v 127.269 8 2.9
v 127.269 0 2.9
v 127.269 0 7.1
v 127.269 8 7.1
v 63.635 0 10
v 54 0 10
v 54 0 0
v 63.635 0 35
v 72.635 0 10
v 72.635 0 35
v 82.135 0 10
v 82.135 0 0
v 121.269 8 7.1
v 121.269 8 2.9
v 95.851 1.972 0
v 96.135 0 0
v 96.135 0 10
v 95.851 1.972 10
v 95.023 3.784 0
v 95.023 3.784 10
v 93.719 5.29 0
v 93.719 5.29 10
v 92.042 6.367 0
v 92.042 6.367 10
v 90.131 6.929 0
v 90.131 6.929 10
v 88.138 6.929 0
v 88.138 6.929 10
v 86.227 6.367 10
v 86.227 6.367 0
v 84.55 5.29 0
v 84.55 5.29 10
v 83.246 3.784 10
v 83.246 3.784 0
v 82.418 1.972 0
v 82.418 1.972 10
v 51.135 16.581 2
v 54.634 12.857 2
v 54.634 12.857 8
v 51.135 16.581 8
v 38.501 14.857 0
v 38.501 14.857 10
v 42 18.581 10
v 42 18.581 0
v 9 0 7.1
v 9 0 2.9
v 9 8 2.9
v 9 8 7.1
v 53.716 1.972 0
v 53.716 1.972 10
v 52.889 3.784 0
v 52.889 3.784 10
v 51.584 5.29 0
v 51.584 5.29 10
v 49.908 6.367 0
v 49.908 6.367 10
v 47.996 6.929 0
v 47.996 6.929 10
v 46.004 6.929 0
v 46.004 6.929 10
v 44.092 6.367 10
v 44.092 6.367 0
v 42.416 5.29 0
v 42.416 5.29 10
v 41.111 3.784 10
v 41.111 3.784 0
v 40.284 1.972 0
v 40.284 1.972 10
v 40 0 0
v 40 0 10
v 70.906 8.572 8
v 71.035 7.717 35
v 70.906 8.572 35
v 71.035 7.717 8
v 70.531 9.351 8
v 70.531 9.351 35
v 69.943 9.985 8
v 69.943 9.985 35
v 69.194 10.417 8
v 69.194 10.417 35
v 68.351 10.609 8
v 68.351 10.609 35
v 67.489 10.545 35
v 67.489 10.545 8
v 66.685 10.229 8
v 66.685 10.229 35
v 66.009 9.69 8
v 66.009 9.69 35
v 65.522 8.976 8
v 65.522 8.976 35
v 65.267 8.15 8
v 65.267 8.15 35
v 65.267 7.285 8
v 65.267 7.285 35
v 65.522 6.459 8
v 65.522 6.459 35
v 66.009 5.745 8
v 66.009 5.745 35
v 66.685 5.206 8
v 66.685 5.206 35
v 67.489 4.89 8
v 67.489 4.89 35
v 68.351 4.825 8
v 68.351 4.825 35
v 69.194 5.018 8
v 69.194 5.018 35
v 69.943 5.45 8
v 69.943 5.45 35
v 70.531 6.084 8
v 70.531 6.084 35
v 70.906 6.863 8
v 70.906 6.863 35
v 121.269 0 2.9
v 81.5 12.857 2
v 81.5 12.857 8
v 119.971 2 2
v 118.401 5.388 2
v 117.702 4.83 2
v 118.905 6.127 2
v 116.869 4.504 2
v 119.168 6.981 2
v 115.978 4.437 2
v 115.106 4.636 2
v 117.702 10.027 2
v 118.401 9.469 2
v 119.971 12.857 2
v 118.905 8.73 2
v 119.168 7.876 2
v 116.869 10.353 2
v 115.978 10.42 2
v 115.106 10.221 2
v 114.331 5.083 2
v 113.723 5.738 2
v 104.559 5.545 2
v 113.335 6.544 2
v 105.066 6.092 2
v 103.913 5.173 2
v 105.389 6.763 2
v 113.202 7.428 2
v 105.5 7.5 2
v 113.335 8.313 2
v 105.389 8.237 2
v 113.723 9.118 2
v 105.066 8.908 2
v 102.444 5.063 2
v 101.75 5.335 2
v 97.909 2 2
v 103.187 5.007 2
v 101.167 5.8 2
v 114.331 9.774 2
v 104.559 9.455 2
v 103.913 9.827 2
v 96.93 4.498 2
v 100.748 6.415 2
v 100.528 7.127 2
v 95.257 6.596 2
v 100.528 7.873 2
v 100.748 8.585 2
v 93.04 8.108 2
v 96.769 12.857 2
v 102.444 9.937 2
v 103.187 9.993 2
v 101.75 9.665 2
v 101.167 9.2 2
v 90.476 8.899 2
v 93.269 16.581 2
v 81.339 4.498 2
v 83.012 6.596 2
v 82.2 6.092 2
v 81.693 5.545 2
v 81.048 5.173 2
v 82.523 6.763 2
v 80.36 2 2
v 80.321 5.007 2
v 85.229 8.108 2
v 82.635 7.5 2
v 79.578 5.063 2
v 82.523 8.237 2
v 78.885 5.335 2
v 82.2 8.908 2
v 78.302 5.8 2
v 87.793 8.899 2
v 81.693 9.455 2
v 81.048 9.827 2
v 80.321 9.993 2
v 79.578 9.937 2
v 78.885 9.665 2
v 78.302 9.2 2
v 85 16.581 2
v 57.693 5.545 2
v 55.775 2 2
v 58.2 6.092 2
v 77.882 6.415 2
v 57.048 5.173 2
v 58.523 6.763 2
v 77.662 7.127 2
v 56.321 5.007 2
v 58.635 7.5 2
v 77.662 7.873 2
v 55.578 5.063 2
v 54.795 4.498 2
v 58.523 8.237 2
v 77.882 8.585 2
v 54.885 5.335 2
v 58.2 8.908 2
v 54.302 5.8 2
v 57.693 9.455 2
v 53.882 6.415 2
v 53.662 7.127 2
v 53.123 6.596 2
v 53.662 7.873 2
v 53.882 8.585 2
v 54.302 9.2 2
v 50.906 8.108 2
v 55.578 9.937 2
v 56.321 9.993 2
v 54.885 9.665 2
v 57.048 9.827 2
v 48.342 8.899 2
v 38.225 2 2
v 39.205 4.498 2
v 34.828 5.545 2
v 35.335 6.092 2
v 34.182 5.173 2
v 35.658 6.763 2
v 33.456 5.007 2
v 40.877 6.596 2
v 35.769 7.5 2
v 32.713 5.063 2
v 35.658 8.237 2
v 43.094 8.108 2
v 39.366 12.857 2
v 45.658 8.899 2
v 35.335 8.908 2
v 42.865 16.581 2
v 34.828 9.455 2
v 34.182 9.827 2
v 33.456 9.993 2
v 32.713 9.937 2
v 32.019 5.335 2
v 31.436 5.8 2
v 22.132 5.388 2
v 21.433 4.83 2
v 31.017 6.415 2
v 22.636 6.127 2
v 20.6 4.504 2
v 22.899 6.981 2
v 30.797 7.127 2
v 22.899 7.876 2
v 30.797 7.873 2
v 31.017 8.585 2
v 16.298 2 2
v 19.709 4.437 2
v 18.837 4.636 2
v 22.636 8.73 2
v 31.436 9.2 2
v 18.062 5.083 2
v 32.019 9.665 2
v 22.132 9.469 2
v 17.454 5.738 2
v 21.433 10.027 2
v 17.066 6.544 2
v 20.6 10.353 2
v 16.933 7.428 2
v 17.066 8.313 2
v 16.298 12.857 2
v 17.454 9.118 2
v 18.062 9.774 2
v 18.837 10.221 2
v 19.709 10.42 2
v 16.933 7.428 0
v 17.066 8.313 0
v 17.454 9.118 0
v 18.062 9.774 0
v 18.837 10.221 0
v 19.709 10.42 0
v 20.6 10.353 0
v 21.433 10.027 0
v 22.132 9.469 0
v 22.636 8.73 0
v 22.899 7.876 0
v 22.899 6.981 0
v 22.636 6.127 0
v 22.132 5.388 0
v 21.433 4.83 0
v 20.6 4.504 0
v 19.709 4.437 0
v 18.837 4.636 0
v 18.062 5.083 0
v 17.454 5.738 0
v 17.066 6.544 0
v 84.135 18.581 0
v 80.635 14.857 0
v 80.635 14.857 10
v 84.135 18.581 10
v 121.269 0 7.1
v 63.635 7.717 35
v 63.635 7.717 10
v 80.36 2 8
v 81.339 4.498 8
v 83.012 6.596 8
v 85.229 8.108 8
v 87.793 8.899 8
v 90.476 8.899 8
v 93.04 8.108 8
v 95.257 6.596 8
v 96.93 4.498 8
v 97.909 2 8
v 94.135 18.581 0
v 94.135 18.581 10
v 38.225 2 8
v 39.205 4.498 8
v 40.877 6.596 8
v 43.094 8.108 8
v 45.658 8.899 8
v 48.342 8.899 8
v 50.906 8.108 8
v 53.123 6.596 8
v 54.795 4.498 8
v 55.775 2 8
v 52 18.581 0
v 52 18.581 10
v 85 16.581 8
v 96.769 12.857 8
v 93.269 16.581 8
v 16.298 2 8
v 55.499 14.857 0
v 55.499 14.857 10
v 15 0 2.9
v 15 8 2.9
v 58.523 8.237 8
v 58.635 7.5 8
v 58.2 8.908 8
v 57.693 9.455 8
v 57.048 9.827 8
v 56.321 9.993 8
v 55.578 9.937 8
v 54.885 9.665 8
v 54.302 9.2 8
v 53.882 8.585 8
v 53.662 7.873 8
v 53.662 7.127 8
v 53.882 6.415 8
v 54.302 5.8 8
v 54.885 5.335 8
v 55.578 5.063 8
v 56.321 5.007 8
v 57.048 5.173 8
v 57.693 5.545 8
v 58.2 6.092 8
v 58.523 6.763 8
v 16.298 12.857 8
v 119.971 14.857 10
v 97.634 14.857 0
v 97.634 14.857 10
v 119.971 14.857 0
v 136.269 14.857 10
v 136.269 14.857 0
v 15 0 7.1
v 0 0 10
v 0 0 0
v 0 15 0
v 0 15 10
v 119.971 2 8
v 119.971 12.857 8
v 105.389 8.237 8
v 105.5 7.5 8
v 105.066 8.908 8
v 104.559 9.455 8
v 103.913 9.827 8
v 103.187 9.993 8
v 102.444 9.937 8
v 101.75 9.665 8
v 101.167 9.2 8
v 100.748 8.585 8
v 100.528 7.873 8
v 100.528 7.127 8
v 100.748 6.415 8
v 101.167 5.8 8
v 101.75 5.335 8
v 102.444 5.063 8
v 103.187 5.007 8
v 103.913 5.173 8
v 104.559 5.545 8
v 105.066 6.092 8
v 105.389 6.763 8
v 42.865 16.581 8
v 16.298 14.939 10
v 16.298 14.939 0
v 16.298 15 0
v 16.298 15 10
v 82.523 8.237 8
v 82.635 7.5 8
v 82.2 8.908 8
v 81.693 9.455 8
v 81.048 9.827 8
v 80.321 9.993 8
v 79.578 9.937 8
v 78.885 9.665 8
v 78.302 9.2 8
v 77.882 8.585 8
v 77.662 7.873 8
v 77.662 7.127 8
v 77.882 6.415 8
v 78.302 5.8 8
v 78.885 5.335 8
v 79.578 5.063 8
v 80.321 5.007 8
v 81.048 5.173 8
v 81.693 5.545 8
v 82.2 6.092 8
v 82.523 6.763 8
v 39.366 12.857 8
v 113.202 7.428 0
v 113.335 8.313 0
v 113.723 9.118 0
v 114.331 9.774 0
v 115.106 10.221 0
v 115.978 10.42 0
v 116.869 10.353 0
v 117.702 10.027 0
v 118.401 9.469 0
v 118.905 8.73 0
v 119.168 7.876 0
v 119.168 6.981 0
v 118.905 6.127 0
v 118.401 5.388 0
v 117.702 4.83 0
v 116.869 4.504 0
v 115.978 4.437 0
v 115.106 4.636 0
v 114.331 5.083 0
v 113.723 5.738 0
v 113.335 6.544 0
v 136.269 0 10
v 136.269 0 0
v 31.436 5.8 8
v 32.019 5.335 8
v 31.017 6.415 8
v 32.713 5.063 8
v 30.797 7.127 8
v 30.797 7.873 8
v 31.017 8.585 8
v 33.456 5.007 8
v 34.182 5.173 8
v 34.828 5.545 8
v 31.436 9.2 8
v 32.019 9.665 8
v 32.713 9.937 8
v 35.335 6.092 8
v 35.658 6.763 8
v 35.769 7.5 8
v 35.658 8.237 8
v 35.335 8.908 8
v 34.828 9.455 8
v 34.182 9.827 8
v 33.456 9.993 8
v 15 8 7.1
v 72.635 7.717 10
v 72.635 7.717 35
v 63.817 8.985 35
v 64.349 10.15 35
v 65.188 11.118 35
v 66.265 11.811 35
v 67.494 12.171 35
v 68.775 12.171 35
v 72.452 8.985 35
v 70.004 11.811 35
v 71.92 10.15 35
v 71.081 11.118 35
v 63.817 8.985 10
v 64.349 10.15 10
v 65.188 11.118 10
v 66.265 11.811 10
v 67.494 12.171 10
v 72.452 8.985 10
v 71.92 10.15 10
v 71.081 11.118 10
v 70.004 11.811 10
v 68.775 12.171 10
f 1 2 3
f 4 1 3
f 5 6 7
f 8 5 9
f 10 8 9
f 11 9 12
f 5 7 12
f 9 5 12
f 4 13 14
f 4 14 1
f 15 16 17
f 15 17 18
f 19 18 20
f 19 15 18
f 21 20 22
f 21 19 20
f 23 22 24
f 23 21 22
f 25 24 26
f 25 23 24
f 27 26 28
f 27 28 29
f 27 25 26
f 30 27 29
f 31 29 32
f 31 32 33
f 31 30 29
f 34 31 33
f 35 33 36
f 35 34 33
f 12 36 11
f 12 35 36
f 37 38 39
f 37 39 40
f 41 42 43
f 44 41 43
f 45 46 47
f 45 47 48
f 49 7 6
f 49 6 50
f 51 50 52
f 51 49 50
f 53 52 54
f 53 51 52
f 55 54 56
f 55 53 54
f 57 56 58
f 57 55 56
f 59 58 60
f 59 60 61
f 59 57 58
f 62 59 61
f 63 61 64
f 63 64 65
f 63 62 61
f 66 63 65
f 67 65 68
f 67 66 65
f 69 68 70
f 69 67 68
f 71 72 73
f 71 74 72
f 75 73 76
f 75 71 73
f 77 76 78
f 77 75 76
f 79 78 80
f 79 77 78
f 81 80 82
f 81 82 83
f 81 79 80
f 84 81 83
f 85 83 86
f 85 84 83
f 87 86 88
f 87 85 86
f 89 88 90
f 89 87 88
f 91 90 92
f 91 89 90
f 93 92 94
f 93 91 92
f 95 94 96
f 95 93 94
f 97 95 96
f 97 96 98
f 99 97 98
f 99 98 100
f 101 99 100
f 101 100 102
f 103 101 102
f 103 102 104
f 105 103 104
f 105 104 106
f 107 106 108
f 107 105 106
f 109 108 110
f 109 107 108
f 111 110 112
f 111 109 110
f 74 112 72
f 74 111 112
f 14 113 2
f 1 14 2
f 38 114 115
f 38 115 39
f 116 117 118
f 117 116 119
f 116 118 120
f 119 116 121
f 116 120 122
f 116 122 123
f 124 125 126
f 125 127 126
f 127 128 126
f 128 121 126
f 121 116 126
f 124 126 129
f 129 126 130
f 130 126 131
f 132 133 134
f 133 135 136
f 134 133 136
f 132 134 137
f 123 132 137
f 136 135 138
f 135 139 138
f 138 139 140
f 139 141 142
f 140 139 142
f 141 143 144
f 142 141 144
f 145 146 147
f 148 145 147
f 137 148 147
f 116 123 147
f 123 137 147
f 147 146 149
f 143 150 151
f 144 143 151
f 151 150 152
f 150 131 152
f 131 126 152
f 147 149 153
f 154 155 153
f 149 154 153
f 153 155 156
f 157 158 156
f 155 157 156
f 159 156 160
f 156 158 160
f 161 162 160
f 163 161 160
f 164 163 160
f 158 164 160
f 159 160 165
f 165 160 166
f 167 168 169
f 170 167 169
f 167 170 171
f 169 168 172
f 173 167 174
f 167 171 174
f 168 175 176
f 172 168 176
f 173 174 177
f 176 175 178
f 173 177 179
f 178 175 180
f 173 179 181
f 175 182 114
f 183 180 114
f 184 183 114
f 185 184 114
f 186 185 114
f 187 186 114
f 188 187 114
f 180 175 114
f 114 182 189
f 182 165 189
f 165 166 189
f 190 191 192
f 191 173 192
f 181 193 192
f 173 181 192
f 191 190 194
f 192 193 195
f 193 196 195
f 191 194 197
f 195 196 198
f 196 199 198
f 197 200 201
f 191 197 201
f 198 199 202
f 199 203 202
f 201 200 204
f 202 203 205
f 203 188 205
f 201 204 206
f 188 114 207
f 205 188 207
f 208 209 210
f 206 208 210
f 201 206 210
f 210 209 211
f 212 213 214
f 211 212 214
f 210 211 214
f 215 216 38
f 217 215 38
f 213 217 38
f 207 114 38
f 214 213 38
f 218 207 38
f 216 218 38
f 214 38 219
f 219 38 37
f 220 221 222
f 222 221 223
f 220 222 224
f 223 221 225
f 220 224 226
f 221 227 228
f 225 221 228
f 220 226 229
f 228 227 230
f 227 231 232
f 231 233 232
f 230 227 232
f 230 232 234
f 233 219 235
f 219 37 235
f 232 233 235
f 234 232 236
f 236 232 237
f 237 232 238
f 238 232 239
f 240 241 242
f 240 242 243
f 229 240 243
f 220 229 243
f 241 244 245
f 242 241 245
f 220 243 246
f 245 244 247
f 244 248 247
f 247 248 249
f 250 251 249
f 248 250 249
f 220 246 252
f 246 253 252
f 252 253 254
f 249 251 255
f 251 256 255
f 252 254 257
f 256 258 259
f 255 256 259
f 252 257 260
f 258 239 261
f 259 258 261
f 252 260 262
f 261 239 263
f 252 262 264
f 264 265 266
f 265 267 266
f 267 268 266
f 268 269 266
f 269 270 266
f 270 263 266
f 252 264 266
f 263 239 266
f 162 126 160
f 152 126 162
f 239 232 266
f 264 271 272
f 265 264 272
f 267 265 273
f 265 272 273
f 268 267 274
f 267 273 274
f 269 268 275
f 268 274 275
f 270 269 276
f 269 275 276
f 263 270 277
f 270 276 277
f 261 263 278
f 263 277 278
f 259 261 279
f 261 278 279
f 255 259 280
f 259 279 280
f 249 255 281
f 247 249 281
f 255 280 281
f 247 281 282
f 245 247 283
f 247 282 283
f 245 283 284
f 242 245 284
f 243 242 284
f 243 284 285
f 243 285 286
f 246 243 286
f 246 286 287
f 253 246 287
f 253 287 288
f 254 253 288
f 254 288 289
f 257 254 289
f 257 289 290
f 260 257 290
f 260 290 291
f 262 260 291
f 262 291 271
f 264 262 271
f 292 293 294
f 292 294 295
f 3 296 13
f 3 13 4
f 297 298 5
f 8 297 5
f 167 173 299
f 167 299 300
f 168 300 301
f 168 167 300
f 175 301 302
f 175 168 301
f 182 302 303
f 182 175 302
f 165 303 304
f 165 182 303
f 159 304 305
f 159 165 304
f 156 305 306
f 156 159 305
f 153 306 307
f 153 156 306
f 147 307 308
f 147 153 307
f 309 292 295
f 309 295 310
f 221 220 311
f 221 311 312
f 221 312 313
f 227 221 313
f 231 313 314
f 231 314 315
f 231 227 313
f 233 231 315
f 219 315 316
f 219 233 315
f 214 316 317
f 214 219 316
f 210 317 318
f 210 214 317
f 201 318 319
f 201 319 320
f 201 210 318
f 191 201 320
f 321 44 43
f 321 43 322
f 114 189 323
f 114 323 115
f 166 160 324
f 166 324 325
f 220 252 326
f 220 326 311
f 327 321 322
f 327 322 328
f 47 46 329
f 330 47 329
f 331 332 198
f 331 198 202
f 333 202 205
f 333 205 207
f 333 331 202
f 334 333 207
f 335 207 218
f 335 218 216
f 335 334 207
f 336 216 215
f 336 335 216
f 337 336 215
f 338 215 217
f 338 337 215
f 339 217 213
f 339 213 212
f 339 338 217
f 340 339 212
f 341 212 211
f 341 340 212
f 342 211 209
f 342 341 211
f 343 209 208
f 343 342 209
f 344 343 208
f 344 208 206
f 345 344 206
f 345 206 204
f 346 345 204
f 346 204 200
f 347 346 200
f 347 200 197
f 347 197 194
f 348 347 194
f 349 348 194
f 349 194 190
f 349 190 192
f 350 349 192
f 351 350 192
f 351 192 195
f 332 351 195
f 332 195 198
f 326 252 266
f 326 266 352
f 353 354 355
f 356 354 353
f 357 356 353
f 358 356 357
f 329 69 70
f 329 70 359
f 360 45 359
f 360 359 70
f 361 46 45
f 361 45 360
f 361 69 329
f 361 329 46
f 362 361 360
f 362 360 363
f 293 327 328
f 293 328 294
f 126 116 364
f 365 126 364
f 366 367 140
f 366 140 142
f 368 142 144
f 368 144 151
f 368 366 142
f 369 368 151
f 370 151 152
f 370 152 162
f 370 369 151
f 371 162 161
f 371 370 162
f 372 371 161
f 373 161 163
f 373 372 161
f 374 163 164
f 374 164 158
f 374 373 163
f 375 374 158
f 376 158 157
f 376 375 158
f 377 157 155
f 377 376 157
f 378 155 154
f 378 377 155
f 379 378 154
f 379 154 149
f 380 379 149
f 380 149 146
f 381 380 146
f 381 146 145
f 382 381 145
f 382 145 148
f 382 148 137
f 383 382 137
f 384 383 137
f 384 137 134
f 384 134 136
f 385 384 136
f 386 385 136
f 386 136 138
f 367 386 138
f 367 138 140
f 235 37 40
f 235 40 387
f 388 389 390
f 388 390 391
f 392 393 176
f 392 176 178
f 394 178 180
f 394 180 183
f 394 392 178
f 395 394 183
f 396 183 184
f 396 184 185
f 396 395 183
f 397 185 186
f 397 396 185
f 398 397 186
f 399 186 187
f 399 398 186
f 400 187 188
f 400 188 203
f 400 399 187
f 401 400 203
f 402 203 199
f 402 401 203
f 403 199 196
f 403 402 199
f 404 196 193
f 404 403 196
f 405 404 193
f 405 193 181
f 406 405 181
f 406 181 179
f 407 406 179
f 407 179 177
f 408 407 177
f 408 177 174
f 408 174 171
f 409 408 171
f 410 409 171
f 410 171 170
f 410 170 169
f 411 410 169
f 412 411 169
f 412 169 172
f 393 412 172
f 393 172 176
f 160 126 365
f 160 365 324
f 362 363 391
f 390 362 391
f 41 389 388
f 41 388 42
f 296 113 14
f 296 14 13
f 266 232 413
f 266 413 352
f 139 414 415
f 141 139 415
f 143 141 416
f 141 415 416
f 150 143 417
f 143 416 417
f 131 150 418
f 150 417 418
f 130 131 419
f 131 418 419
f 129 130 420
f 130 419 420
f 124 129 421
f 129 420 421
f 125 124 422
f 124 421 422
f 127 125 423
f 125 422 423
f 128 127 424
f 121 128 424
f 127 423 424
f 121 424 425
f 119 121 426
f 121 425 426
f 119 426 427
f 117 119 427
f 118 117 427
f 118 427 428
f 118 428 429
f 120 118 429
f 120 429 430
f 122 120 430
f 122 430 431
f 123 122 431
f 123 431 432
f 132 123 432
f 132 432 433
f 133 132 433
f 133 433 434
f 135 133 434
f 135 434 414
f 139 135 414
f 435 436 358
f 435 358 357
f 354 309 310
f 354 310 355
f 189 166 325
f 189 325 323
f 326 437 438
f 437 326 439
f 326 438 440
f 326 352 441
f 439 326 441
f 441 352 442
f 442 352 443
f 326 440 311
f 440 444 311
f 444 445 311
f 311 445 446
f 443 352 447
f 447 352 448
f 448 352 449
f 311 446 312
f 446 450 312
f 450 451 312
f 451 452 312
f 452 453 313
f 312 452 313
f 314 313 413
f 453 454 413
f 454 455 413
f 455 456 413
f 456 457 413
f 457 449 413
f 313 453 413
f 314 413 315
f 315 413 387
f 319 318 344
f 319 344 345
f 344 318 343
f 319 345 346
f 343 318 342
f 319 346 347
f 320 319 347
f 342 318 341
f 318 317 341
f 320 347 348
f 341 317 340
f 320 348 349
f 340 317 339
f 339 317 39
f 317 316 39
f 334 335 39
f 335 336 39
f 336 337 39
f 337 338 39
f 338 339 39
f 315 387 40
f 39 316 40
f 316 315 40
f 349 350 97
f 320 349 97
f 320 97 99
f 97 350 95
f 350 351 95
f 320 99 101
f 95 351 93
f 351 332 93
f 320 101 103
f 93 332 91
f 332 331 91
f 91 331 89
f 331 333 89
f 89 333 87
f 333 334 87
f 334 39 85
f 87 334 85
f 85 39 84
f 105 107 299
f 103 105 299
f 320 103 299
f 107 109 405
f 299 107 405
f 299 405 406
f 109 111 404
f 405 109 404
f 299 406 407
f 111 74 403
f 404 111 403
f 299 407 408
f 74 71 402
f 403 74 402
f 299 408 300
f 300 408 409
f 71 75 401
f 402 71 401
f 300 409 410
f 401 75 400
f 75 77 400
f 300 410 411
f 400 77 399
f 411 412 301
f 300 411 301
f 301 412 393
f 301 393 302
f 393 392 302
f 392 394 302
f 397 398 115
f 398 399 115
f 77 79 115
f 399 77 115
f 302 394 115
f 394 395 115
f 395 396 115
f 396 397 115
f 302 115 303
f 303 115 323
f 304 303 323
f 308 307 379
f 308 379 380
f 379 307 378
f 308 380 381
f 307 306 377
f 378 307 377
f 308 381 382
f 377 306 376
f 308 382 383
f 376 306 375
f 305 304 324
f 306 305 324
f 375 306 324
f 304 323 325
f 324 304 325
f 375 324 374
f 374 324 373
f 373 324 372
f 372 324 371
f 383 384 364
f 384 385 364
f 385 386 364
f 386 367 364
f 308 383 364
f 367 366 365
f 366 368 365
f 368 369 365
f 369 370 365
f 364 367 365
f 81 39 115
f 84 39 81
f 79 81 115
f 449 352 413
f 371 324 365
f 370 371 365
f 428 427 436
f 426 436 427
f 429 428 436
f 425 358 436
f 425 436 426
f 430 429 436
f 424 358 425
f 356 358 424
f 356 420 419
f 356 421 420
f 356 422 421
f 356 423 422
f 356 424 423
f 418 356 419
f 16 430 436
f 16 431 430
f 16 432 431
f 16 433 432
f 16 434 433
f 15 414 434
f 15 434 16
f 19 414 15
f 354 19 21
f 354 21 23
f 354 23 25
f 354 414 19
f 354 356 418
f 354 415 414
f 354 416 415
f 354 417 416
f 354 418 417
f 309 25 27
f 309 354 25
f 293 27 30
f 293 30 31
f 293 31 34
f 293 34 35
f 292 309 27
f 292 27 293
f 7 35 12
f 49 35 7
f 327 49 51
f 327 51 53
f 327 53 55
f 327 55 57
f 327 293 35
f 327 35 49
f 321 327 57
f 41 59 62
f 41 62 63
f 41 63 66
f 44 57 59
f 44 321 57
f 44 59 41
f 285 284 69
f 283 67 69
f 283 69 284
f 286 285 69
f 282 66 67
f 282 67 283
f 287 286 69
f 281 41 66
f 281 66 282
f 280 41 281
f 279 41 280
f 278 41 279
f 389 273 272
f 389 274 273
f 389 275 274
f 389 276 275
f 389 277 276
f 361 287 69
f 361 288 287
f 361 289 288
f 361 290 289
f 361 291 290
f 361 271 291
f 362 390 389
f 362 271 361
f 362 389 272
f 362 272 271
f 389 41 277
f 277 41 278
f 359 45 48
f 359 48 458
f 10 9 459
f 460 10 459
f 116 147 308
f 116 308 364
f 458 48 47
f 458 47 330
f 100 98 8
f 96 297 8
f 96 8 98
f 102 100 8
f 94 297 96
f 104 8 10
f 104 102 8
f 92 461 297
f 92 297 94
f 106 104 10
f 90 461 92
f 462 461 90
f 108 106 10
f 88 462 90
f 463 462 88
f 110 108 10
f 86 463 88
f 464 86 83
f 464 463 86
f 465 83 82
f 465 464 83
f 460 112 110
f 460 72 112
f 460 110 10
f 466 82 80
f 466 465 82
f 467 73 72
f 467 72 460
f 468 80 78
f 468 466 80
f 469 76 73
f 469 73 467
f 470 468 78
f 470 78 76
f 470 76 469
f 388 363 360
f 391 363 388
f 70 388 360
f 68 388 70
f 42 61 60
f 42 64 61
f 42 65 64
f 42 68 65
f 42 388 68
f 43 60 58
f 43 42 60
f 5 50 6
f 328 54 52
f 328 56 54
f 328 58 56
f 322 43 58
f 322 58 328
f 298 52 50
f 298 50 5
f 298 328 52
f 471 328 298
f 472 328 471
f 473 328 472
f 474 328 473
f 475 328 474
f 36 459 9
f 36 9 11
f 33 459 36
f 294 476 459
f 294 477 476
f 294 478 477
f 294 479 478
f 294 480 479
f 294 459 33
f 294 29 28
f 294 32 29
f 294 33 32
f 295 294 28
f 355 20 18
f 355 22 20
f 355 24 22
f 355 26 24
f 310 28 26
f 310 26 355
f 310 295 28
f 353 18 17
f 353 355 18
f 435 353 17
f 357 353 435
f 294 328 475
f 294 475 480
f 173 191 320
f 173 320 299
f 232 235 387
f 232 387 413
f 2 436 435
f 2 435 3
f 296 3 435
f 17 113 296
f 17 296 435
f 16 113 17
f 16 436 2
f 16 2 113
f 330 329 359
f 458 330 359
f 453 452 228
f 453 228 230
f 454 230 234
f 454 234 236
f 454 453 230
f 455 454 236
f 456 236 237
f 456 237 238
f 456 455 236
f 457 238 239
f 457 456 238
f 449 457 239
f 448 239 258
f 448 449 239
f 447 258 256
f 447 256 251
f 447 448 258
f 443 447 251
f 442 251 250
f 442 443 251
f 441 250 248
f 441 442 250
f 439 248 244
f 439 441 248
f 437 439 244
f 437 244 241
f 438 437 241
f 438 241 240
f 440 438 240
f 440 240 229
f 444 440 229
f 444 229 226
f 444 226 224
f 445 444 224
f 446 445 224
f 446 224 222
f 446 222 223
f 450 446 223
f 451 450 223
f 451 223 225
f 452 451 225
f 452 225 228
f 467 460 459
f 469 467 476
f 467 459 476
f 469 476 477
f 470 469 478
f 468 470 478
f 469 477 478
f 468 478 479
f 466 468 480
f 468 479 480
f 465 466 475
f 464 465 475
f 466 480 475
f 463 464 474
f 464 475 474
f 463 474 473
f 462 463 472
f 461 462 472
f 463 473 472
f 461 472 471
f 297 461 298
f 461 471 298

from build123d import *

# Parameters (mm, degrees)
BOSS_EXTRUDE1_DEPTH = 10
BOSS_EXTRUDE2_START = -2
BOSS_EXTRUDE2_DEPTH = 2
BOSS_EXTRUDE3_DEPTH = 2
SKETCH6_R           = 4.5
SKETCH6_R_2         = 2.9
BOSS_EXTRUDE4_DEPTH = 25
CUT_EXTRUDE1_START  = -8
SKETCH7_R           = 2.9
CUT_EXTRUDE1_DEPTH  = 8
SKETCH9_R           = 2.5
BOSS_EXTRUDE5_DEPTH = 10
BOSS_EXTRUDE6_START = -25
BOSS_EXTRUDE6_DEPTH = 25
SKETCH13_W          = 16.297841409
SKETCH13_H          = 10
BOSS_EXTRUDE7_DEPTH = 15
SKETCH14_W          = 6
SKETCH14_H          = 4.2
CUT_EXTRUDE4_DEPTH  = 8
SKETCH17_W          = 10
SKETCH17_H          = 0.143122073
CUT_EXTRUDE5_DEPTH  = 16.297841409
SKETCH18_R          = 3
CUT_EXTRUDE6_DEPTH  = 3


with BuildPart() as part:
    # Sketch1 → Boss-Extrude1 (new body)
    with BuildSketch(Plane.XY):
        with BuildLine():
            Line((0, 0), (0, 15))
            Line((0, 15), (38.500664221, 14.856877927))
            Line((38.500664221, 14.856877927), (42, 18.580686342))
            Line((42, 18.580686342), (47, 18.580686342))
            Line((47, 18.580686342), (52, 18.580686342))
            Line((52, 18.580686342), (55.499335779, 14.856877927))
            Line((55.499335779, 14.856877927), (80.635168579, 14.856877927))
            Line((80.635168579, 14.856877927), (84.134504358, 18.580686342))
            Line((84.134504358, 18.580686342), (89.134504358, 18.580686342))
            Line((89.134504358, 18.580686342), (94.134504358, 18.580686342))
            Line((94.134504358, 18.580686342), (97.633840137, 14.856877927))
            Line((97.633840137, 14.856877927), (136.134504358, 14.856877927))
            Line((136.134504358, 14.856877927), (136.134504358, 0))
            Line((136.134504358, 0), (96.134504358, 0))
            ThreePointArc((96.134504358, 0), (89.134504358, 7), (82.134504358, 0))
            Line((82.134504358, 0), (54, 0))
            ThreePointArc((54, 0), (47, 7), (40, 0))
            Line((40, 0), (0, 0))
        make_face()
        with BuildLine():
            Line((81.500231462, 12.856877927), (54.634272896, 12.856877927))
            Line((54.634272896, 12.856877927), (51.134937117, 16.580686342))
            Line((51.134937117, 16.580686342), (47, 16.580686342))
            Line((47, 16.580686342), (42.865062883, 16.580686342))
            Line((42.865062883, 16.580686342), (39.365727104, 12.856877927))
            Line((39.365727104, 12.856877927), (2, 12.856877927))
            Line((2, 12.856877927), (2, 2))
            Line((2, 2), (38.225035613, 2))
            ThreePointArc((38.225035613, 2), (47, 9), (55.774964387, 2))
            Line((55.774964387, 2), (80.35953997, 2))
            ThreePointArc((80.35953997, 2), (89.134504358, 9), (97.909468745, 2))
            Line((97.909468745, 2), (134.134504358, 2))
            Line((134.134504358, 2), (134.134504358, 12.856877927))
            Line((134.134504358, 12.856877927), (96.768777254, 12.856877927))
            Line((96.768777254, 12.856877927), (93.269441475, 16.580686342))
            Line((93.269441475, 16.580686342), (89.134504358, 16.580686342))
            Line((89.134504358, 16.580686342), (84.999567241, 16.580686342))
            Line((84.999567241, 16.580686342), (81.500231462, 12.856877927))
        make_face(mode=Mode.SUBTRACT)
    extrude(amount=BOSS_EXTRUDE1_DEPTH)

    # Sketch2 → Boss-Extrude2 (add)
    with BuildSketch(Plane.XY.offset(10).offset(BOSS_EXTRUDE2_START)):
        with BuildLine():
            Line((136.134504358, 0), (136.134504358, 14.856877927))
            Line((136.134504358, 14.856877927), (97.633840137, 14.856877927))
            Line((97.633840137, 14.856877927), (94.134504358, 18.580686342))
            Line((94.134504358, 18.580686342), (84.134504358, 18.580686342))
            Line((84.134504358, 18.580686342), (80.635168579, 14.856877927))
            Line((80.635168579, 14.856877927), (55.499335779, 14.856877927))
            Line((55.499335779, 14.856877927), (52, 18.580686342))
            Line((52, 18.580686342), (42, 18.580686342))
            Line((42, 18.580686342), (38.500664221, 14.856877927))
            Line((38.500664221, 14.856877927), (0, 15))
            Line((0, 15), (0, 0))
            Line((0, 0), (40, 0))
            ThreePointArc((40, 0), (47, 7), (54, 0))
            Line((54, 0), (82.134504358, 0))
            ThreePointArc((82.134504358, 0), (89.134504358, 7), (96.134504358, 0))
            Line((96.134504358, 0), (136.134504358, 0))
        make_face()
    extrude(amount=BOSS_EXTRUDE2_DEPTH)

    # Sketch3 → Boss-Extrude3 (add)
    with BuildSketch(Plane(origin=(0, 0, 0), x_dir=(-1, 0, 0), z_dir=(0, 0, -1))):
        with BuildLine():
            Line((0, 15), (-38.500664221, 14.856877927))
            Line((-38.500664221, 14.856877927), (-42, 18.580686342))
            Line((-42, 18.580686342), (-52, 18.580686342))
            Line((-52, 18.580686342), (-55.499335779, 14.856877927))
            Line((-55.499335779, 14.856877927), (-80.635168579, 14.856877927))
            Line((-80.635168579, 14.856877927), (-84.134504358, 18.580686342))
            Line((-84.134504358, 18.580686342), (-94.134504358, 18.580686342))
            Line((-94.134504358, 18.580686342), (-97.633840137, 14.856877927))
            Line((-97.633840137, 14.856877927), (-136.134504358, 14.856877927))
            Line((-136.134504358, 14.856877927), (-136.134504358, 0))
            Line((-136.134504358, 0), (-96.134504358, 0))
            ThreePointArc((-96.134504358, 0), (-89.134504358, 7), (-82.134504358, 0))
            Line((-82.134504358, 0), (-54, 0))
            ThreePointArc((-54, 0), (-47, 7), (-40, 0))
            Line((-40, 0), (0, 0))
            Line((0, 0), (0, 15))
        make_face()
    extrude(amount=-BOSS_EXTRUDE3_DEPTH)

    # Sketch6 → Boss-Extrude4 (add)
    with BuildSketch(Plane.XY.offset(10)):
        with Locations(Location((68.134504358, 7.717300047, 0), (0, 0, 180))):
            Circle(SKETCH6_R)
        with Locations((68.134504358, 7.717300047)):
            Circle(SKETCH6_R_2, mode=Mode.SUBTRACT)
    extrude(amount=BOSS_EXTRUDE4_DEPTH)

    # Sketch7 → Cut-Extrude1 (cut)
    with BuildSketch(Plane.XY.offset(10).offset(CUT_EXTRUDE1_START)):
        with Locations((68.134504358, 7.717300047)):
            Circle(SKETCH7_R)
    extrude(amount=CUT_EXTRUDE1_DEPTH, mode=Mode.SUBTRACT)

    # Sketch9 → Boss-Extrude5 (add)
    with BuildSketch(Plane.XY.offset(10)):
        with Locations((126.134504358, 7.356877927)):
            Circle(SKETCH9_R)
        with Locations((103, 7.5)):
            Circle(SKETCH9_R)
        with Locations((80.134504358, 7.5)):
            Circle(SKETCH9_R)
        with Locations((10.134504358, 7.356877927)):
            Circle(SKETCH9_R)
        with Locations((33.269008716, 7.5)):
            Circle(SKETCH9_R)
        with Locations((56.134504358, 7.5)):
            Circle(SKETCH9_R)
    extrude(amount=-BOSS_EXTRUDE5_DEPTH)

    # Sketch10 → Boss-Extrude6 (add)
    with BuildSketch(Plane.XY.offset(35).offset(BOSS_EXTRUDE6_START)):
        with BuildLine():
            Line((63.634504358, 7.717300047), (63.634504358, 0))
            Line((63.634504358, 0), (72.634504358, 0))
            Line((72.634504358, 0), (72.634504358, 7.717300047))
            ThreePointArc((72.634504358, 7.717300047), (68.134504358, 3.217300047), (63.634504358, 7.717300047))
        make_face()
    extrude(amount=BOSS_EXTRUDE6_DEPTH)

    # Sketch13 → Boss-Extrude7 (add)
    with BuildSketch(Plane.XZ):
        with Locations((8.148920705, 5)):
            Rectangle(SKETCH13_W, SKETCH13_H)
        with Locations((128.120088012, 5)):
            Rectangle(SKETCH13_W, SKETCH13_H)
    extrude(amount=-BOSS_EXTRUDE7_DEPTH)

    # Sketch14 → Cut-Extrude4 (cut)
    with BuildSketch(Plane.XZ):
        with Locations((12, 5)):
            Rectangle(SKETCH14_W, SKETCH14_H)
        with Locations((124.269008716, 5)):
            Rectangle(SKETCH14_W, SKETCH14_H)
    extrude(amount=-CUT_EXTRUDE4_DEPTH, mode=Mode.SUBTRACT)

    # Sketch17 → Cut-Extrude5 (cut)
    with BuildSketch(Plane.ZY.offset(-119.971167307)):
        with Locations((5, 14.928438964)):
            Rectangle(SKETCH17_W, SKETCH17_H)
    extrude(amount=-CUT_EXTRUDE5_DEPTH, mode=Mode.SUBTRACT)

    # Sketch18 → Cut-Extrude6 (cut)
    with BuildSketch(Plane(origin=(0, 0, 0), x_dir=(-1, 0, 0), z_dir=(0, 0, -1))):
        with Locations((-116.201756537, 7.428438964)):
            Circle(SKETCH18_R)
        with Locations((-19.932747821, 7.428438964)):
            Circle(SKETCH18_R)
    extrude(amount=-CUT_EXTRUDE6_DEPTH, mode=Mode.SUBTRACT)


solid = part.part
